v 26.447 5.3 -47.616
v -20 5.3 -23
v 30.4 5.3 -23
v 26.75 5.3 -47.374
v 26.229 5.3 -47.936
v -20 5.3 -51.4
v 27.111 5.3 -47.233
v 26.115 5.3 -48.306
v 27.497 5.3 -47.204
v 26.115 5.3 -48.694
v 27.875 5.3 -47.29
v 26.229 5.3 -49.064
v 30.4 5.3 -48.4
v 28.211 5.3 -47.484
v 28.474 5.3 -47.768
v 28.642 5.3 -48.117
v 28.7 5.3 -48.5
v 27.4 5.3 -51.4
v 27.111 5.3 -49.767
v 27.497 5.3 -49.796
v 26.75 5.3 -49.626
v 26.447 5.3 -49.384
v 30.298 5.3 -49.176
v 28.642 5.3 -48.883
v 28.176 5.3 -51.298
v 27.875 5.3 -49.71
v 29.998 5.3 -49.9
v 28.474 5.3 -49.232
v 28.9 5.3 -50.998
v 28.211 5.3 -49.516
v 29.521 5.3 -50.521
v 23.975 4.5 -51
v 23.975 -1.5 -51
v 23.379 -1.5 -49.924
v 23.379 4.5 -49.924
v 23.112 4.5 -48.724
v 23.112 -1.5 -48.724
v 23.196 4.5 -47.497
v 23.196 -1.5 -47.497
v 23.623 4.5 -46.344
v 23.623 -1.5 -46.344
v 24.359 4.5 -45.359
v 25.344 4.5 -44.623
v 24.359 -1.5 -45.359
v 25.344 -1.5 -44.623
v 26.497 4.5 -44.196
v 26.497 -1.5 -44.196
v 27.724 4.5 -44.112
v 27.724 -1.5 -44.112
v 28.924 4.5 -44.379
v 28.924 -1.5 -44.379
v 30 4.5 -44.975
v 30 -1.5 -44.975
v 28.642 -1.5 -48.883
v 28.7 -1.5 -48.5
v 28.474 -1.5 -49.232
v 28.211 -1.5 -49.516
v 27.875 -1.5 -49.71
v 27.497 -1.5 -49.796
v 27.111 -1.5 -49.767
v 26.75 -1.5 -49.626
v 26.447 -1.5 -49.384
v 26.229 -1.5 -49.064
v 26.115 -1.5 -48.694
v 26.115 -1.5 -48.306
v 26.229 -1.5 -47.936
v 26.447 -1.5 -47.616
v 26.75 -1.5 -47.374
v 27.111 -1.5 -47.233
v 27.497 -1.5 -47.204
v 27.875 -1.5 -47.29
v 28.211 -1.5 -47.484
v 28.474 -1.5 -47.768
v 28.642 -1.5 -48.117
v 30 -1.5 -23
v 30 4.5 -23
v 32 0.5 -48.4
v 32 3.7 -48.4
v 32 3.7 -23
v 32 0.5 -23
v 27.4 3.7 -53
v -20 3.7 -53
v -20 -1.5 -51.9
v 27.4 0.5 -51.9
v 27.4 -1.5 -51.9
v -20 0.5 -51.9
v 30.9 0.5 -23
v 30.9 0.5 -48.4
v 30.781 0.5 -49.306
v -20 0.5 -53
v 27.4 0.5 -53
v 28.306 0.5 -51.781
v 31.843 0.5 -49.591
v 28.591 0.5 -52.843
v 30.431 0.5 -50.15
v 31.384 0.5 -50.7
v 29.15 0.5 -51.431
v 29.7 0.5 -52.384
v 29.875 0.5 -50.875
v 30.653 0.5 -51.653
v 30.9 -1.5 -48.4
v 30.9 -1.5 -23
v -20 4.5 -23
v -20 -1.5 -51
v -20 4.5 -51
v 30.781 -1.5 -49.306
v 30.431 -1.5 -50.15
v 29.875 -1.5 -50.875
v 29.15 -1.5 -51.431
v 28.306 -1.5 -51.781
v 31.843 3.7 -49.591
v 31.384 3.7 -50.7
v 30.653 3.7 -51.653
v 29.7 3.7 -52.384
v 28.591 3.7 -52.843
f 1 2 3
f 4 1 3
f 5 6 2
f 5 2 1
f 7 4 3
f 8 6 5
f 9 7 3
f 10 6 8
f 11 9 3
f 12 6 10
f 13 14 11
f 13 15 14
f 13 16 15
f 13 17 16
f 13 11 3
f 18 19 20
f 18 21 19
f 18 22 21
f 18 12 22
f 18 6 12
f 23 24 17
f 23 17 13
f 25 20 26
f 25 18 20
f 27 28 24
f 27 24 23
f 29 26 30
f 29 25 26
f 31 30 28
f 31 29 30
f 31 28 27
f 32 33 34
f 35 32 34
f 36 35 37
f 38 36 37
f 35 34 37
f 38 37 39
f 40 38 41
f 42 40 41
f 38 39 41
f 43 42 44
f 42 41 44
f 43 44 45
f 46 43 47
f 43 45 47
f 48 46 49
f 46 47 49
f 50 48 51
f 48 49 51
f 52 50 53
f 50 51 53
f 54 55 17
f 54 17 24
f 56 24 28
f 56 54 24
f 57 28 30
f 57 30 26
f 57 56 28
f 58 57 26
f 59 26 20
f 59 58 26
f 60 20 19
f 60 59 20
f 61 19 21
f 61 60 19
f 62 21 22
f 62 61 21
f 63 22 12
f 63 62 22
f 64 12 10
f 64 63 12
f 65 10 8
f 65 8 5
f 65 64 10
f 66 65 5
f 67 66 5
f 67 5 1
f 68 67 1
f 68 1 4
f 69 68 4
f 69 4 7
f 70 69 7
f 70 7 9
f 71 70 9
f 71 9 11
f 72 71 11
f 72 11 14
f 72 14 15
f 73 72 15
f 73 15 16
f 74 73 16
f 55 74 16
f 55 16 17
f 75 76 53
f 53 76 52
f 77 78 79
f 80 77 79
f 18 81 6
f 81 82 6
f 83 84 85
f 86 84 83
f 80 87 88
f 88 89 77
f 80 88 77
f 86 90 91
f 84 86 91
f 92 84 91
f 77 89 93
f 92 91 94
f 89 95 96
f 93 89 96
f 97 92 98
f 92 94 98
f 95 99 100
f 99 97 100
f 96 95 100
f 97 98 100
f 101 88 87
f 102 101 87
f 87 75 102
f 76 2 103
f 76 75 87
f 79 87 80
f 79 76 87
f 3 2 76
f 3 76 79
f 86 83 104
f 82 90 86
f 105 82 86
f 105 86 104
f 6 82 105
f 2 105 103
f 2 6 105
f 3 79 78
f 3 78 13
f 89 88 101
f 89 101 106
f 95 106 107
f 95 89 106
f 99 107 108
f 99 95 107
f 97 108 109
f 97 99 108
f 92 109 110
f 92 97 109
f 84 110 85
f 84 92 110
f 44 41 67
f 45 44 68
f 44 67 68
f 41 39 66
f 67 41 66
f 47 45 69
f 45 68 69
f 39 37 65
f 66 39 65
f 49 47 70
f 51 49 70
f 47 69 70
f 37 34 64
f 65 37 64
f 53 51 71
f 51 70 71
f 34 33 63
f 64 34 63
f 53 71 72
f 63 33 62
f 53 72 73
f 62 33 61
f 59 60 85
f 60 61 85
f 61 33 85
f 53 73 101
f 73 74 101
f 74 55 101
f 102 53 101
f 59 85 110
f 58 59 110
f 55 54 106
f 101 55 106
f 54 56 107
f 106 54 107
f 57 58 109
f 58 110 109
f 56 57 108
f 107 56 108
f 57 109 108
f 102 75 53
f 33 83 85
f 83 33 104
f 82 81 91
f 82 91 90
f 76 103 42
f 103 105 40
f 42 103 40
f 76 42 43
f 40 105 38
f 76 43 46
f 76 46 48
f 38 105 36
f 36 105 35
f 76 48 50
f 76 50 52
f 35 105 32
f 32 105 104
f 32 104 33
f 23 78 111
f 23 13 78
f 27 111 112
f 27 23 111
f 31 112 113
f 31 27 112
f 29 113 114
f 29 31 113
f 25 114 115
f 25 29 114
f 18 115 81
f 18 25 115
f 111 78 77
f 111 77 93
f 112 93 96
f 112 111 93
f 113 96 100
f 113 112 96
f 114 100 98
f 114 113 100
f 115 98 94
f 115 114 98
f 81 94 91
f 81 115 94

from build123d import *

# Parameters (mm, degrees)
SKETCH005_R      = 1.3
EXTRUDE003_DEPTH = 20
EXTRUDE039_DEPTH = 4
EXTRUDE042_DEPTH = 0.8
EXTRUDE002_DEPTH = 6
EXTRUDE037_DEPTH = 2


with BuildPart() as sweep001:
    # Sweep001: sweep along a path in Sketch034
    with BuildLine(Plane.XZ.offset(10)) as sweep001_path:
        Line((32, 12), (32, 48.4))
        ThreePointArc((32, 48.4), (30.652691, 51.652691), (27.4, 53))
        Line((27.4, 53), (-20, 53))
    # Sketch035 → Sweep001 (sweep)
    with BuildSketch(Plane.YZ):
        Polygon((5.3, 51.4), (3.7, 53), (3.7, 54), (6, 54), (6, 51.4), align=None)
    sweep(path=sweep001_path.line)


with BuildPart() as fusion030:
    # Sketch005 → Extrude003 (new body)
    with BuildSketch(Plane.XZ.offset(5)):
        with Locations((27.4, 48.5)):
            Circle(SKETCH005_R)
    extrude(amount=-EXTRUDE003_DEPTH)


with BuildPart() as fusion030_1:
    # Extrude003 placement: moved
    add(fusion030.part.moved(Location((0, -4, 0))))

    # Fusion030: union Sweep001
    add(sweep001.part)


with BuildPart() as top003:
    # Sketch028 → Extrude039 (new body)
    with BuildSketch(Plane.XZ.offset(10)):
        with BuildLine():
            ThreePointArc((32, 48.4), (30.652691, 51.652691), (27.4, 53))
            Line((27.4, 53), (-20, 53))
            Line((-20, 53), (-20, 51))
            Line((-20, 51), (27.4, 51))
            ThreePointArc((30, 48.4), (29.238478, 50.238478), (27.4, 51))
            Line((30, 23), (30, 48.4))
            Line((32, 23), (30, 23))
            Line((32, 48.4), (32, 23))
        make_face()
    extrude(amount=EXTRUDE039_DEPTH)


with BuildPart() as top003_1:
    # Extrude039 placement: moved
    add(top003.part.moved(Location((0, 14.5, 0))))


with BuildPart() as top002:
    # Sketch031 → Extrude042 (new body)
    with BuildSketch(Plane.XZ.offset(10)):
        with BuildLine():
            ThreePointArc((32, 48.4), (30.652691, 51.652691), (27.4, 53))
            Line((27.4, 53), (-20, 53))
            Line((-20, 53), (-20, 23))
            Line((-20, 23), (32, 23))
            Line((32, 48.4), (32, 23))
        make_face()
    extrude(amount=EXTRUDE042_DEPTH)


with BuildPart() as top002_1:
    # Extrude042 placement: moved
    add(top002.part.moved(Location((0, 15.3, 0))))


with BuildPart() as screw_hole_top:
    # Sketch004 → Extrude002 (new body)
    with BuildSketch(Plane.XZ.offset(10)):
        with BuildLine():
            ThreePointArc((23.975091, 51), (24.359441, 45.359441), (30, 44.975091))
            Line((30, 44.975091), (30, 48.4))
            ThreePointArc((30, 48.4), (29.238478, 50.238478), (27.4, 51))
            Line((23.975091, 51), (27.4, 51))
        make_face()
    extrude(amount=-EXTRUDE002_DEPTH)


with BuildPart() as screw_hole_top_1:
    # Extrude002 placement: moved
    add(screw_hole_top.part.moved(Location((0, 8.5, 0))))


with BuildPart() as top:
    # Sketch029 → Extrude037 (new body)
    with BuildSketch(Plane.XZ.offset(10)):
        with BuildLine():
            ThreePointArc((30.9, 48.4), (29.874874, 50.874874), (27.4, 51.9))
            Line((27.4, 51.9), (-20, 51.9))
            Line((-20, 51.9), (-20, 51))
            Line((-20, 51), (27.4, 51))
            ThreePointArc((30, 48.4), (29.238478, 50.238478), (27.4, 51))
            Line((30, 23), (30, 48.4))
            Line((30.9, 23), (30, 23))
            Line((30.9, 48.4), (30.9, 23))
        make_face()
    extrude(amount=EXTRUDE037_DEPTH)


with BuildPart() as top_1:
    # Extrude037 placement: moved
    add(top.part.moved(Location((0, 10.5, 0))))

    # Fusion028: union top003, top002, screw hole top
    add(top003_1.part)
    add(top002_1.part)
    add(screw_hole_top_1.part)

    # Cut024: cut Fusion030
    add(fusion030_1.part, mode=Mode.SUBTRACT)


with BuildPart() as part_mirroring001:
    # Part__Mirroring001: instance of top
    add(top_1.part.mirror(Plane(origin=(0, 0, 0), x_dir=(0, 1, 0), z_dir=(0, 0, 1))))


solid = part_mirroring001.part
